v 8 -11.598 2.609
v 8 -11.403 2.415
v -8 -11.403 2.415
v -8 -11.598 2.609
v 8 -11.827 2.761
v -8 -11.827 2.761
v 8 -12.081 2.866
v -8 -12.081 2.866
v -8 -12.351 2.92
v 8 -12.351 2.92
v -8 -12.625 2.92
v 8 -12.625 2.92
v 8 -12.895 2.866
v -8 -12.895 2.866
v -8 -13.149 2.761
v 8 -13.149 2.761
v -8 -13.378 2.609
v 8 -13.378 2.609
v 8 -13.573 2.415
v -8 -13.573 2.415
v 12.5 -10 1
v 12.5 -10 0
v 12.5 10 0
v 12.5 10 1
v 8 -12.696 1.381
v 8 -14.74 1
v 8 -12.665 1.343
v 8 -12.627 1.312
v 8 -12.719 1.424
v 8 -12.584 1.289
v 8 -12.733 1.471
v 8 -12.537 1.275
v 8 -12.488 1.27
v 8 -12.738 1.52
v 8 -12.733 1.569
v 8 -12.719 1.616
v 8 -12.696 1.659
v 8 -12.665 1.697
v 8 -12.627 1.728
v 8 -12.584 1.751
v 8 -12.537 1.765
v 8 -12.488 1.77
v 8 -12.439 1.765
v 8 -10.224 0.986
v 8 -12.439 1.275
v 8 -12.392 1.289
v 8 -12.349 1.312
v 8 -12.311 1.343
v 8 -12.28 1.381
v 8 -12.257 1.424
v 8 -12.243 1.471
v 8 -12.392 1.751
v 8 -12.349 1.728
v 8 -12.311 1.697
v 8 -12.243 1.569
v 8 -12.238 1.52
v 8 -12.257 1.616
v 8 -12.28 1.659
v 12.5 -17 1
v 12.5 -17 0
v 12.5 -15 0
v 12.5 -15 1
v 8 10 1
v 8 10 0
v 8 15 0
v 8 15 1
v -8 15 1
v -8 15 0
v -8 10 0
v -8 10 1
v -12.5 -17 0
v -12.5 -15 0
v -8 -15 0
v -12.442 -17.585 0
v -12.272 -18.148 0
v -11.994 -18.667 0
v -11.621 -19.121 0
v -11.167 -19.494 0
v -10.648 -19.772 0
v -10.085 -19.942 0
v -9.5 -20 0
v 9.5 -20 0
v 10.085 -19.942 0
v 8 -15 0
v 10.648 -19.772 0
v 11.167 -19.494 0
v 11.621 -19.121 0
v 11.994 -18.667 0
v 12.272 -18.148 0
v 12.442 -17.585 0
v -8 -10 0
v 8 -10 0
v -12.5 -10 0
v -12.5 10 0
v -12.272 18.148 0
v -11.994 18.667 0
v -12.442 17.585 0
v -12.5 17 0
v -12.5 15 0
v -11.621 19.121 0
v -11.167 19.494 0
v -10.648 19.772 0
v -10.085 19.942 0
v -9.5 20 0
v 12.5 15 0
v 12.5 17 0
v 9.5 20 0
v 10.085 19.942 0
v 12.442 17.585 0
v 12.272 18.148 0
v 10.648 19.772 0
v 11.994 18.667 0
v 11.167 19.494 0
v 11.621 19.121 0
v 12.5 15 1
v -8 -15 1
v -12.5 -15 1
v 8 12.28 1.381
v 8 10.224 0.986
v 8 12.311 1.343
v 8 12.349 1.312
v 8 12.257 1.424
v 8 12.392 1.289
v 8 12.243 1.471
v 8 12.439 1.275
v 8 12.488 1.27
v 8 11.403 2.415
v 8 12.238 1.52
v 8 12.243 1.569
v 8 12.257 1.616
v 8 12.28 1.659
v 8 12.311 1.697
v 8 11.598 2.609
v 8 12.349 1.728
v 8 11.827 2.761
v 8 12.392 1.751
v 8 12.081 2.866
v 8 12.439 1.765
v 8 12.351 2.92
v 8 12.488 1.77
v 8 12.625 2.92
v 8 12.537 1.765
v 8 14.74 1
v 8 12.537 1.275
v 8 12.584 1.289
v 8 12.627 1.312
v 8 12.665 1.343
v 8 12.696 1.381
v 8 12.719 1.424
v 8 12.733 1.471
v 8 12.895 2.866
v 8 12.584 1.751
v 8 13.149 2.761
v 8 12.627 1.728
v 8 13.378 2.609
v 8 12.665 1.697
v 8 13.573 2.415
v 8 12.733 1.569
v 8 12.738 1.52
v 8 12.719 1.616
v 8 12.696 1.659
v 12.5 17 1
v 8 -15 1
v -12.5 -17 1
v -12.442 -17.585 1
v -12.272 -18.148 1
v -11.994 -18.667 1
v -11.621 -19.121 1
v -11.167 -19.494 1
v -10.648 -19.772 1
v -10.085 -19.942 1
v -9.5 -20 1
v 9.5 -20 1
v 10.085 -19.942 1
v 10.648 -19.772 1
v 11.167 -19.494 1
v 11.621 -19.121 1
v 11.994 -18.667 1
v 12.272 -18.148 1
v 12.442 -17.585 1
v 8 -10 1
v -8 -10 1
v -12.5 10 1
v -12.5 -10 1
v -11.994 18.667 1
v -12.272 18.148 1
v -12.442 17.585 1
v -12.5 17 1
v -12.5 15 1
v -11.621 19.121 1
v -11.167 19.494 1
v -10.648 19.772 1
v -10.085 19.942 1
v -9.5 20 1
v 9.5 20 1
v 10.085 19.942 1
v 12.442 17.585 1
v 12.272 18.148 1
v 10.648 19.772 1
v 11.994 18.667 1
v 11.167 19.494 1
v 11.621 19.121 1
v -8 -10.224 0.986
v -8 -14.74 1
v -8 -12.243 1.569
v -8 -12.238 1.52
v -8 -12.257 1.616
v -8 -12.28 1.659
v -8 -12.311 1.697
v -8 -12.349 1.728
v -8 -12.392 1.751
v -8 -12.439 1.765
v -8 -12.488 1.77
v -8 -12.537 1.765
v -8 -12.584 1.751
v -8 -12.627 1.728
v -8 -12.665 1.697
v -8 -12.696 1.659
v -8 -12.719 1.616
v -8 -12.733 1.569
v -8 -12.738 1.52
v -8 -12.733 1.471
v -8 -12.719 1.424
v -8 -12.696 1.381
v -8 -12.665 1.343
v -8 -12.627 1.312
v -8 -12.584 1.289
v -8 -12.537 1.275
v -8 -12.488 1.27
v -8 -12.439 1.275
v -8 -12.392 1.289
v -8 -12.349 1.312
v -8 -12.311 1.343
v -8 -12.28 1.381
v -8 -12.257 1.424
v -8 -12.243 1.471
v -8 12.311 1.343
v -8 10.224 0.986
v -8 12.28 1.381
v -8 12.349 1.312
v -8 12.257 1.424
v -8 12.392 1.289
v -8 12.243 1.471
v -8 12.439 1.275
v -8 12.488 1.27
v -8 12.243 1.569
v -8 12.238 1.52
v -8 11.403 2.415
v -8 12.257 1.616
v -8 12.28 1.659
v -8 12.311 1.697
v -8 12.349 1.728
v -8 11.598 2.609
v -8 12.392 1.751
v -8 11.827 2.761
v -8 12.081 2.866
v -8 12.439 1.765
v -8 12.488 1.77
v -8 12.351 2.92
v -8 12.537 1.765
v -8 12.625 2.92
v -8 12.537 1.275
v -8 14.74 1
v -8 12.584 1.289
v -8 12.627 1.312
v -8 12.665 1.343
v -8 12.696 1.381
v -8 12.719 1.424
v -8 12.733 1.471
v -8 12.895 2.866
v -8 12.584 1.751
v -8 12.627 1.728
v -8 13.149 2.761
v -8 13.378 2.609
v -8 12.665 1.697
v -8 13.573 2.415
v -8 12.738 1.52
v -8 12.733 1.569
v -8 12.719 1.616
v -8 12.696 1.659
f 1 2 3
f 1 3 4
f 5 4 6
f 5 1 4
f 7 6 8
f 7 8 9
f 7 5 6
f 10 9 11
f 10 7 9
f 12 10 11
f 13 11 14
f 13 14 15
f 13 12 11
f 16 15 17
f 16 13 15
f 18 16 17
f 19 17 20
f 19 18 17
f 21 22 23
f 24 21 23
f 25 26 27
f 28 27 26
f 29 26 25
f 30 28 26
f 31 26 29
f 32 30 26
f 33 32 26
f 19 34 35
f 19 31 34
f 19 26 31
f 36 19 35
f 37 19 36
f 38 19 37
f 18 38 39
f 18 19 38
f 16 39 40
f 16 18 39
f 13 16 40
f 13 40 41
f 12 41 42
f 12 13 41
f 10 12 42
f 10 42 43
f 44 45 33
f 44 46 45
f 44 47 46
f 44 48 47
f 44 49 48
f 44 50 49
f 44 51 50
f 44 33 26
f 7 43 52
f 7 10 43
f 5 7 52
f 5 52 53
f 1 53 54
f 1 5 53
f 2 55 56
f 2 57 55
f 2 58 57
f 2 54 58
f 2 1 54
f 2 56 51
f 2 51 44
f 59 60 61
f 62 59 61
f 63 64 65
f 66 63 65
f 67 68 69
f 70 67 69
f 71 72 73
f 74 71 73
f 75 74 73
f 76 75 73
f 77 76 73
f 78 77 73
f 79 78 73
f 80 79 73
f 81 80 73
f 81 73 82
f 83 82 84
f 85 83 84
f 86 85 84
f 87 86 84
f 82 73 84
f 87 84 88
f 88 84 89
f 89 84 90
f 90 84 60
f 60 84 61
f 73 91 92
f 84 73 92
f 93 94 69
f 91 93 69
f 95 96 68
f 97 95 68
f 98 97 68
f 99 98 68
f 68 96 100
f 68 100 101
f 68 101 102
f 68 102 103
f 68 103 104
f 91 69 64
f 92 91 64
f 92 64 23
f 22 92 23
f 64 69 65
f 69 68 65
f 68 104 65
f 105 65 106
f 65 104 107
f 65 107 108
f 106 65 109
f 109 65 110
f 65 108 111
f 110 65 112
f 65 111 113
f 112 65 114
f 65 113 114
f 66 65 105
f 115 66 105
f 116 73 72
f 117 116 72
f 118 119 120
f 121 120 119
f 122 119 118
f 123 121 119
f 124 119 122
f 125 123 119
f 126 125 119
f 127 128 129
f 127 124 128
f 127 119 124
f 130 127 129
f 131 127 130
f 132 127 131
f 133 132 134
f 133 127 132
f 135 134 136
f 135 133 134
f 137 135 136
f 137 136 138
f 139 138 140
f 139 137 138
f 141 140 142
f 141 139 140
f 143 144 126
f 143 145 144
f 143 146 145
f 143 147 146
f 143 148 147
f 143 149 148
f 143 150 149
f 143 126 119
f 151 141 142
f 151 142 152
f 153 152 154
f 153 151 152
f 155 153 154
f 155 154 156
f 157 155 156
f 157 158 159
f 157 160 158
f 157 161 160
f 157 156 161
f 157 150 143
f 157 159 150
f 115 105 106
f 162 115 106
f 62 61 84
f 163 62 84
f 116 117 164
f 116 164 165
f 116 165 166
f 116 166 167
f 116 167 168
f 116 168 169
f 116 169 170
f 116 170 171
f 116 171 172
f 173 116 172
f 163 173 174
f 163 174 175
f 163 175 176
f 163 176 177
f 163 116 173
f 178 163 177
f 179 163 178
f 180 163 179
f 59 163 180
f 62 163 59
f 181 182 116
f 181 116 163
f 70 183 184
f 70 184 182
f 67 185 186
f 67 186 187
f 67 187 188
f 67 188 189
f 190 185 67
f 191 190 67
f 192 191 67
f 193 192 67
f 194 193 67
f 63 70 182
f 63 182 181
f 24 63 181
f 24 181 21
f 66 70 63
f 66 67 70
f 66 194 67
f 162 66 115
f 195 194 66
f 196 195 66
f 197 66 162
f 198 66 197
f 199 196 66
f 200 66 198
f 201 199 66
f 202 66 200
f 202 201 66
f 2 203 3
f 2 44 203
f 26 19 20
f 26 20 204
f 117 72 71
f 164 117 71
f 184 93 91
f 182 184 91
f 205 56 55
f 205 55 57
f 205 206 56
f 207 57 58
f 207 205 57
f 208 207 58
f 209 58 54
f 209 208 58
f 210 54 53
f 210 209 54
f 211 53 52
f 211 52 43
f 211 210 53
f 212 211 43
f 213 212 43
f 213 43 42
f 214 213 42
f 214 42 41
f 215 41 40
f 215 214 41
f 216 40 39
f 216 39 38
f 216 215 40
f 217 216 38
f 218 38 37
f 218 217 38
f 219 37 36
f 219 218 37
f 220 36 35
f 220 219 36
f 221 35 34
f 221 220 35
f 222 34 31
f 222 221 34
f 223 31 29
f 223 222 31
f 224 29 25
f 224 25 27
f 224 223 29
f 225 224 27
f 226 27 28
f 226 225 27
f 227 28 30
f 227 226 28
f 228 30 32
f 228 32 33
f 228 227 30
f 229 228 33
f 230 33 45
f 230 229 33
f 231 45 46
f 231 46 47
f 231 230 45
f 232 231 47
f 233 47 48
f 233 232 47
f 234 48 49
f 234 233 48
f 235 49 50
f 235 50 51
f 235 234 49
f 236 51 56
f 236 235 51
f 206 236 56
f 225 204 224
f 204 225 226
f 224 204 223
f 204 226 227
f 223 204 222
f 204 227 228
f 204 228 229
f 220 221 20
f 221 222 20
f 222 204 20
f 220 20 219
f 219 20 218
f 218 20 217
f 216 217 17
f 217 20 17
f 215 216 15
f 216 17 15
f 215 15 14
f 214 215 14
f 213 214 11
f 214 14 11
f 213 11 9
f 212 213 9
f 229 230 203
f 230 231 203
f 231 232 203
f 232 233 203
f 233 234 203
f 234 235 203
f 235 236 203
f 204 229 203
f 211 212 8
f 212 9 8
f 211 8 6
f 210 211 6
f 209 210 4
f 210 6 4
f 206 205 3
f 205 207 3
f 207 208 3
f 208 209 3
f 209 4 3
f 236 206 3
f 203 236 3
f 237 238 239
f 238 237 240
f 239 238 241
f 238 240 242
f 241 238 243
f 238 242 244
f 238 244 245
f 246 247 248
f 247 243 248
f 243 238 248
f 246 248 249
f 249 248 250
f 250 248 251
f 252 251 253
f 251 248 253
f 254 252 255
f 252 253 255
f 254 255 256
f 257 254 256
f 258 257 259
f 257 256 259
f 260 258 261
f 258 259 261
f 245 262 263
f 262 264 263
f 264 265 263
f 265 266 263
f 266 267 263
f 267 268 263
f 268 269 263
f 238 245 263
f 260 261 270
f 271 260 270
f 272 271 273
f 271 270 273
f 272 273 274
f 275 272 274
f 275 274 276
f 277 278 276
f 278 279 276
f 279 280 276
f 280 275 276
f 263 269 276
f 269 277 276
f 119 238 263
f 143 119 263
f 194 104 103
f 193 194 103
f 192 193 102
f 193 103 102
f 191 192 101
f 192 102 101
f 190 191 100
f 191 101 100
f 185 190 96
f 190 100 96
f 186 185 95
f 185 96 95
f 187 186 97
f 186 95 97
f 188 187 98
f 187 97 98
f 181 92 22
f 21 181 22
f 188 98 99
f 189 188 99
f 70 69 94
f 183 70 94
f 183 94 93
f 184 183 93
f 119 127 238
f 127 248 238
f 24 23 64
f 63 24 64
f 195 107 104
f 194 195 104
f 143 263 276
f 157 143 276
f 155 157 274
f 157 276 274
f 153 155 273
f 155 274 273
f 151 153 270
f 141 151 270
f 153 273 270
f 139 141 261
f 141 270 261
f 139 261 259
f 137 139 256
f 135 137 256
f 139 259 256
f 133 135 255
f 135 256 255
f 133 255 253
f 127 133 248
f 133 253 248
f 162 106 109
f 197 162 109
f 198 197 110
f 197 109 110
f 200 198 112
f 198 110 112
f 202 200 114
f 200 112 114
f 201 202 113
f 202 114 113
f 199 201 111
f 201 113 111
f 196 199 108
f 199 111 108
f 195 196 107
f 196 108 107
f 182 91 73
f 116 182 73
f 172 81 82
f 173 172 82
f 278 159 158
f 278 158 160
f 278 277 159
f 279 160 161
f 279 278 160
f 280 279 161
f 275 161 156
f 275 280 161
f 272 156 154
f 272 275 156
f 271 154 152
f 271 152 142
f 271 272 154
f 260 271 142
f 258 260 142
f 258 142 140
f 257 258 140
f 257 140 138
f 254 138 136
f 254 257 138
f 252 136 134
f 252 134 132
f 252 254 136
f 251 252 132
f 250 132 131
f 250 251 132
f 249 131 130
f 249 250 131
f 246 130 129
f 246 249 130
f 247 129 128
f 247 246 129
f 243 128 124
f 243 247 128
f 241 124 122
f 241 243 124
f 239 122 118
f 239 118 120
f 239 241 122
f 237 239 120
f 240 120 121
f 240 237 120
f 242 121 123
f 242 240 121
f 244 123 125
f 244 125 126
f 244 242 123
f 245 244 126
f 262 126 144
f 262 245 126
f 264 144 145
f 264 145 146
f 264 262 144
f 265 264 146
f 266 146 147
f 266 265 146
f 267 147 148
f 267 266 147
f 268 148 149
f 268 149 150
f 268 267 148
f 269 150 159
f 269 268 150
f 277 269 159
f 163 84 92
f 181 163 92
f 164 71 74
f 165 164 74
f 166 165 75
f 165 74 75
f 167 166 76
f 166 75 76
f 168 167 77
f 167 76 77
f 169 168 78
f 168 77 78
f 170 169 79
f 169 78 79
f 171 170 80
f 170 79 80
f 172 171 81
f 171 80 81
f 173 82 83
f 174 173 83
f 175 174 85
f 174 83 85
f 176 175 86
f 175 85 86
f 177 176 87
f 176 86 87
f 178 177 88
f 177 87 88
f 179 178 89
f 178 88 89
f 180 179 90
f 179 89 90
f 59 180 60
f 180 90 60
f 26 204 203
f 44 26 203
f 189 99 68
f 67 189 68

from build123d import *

# Parameters (mm, degrees)
F1_DEPTH = 1
F2_R     = 0.25
F3_DEPTH = 8


with BuildPart() as f1:
    # F0 (on Top) → F1 (new body)
    with BuildSketch(Plane.XY):
        with BuildLine():
            ThreePointArc((12.5, 17), (11.62132, 19.12132), (9.5, 20))
            Line((9.5, 20), (-9.5, 20))
            ThreePointArc((-9.5, 20), (-11.62132, 19.12132), (-12.5, 17))
            Line((-12.5, 17), (-12.5, 15))
            Line((-12.5, 15), (-8, 15))
            Line((-8, 15), (-8, 10))
            Line((-8, 10), (-12.5, 10))
            Line((-12.5, 10), (-12.5, -10))
            Line((-12.5, -10), (-8, -10))
            Line((-8, -10), (-8, -15))
            Line((-8, -15), (-12.5, -15))
            Line((-12.5, -15), (-12.5, -17))
            ThreePointArc((-12.5, -17), (-11.62132, -19.12132), (-9.5, -20))
            Line((-9.5, -20), (9.5, -20))
            ThreePointArc((9.5, -20), (11.62132, -19.12132), (12.5, -17))
            Line((12.5, -17), (12.5, -15))
            Line((12.5, -15), (8, -15))
            Line((8, -15), (8, -10))
            Line((8, -10), (12.5, -10))
            Line((12.5, -10), (12.5, 10))
            Line((12.5, 10), (8, 10))
            Line((8, 10), (8, 15))
            Line((8, 15), (12.5, 15))
            Line((12.5, 15), (12.5, 17))
        make_face()
    extrude(amount=F1_DEPTH)


with BuildPart() as f3:
    # F2 (on Right) → F3 (new body, symmetric)
    with BuildSketch(Plane.YZ):
        with BuildLine():
            Line((14.740349, 1.000379), (13.572576, 2.415229))
            ThreePointArc((13.572576, 2.415229), (12.487946, 2.926366), (11.403316, 2.415229))
            Line((11.403316, 2.415229), (10.223768, 0.986112))
            Line((10.223768, 0.986112), (14.740349, 1.000379))
        make_face()
        with Locations((12.487946, 1.520009)):
            Circle(F2_R, mode=Mode.SUBTRACT)
        with BuildLine():
            Line((-10.223768, 0.986112), (-11.403316, 2.415229))
            ThreePointArc((-11.403316, 2.415229), (-12.487946, 2.926366), (-13.572576, 2.415229))
            Line((-13.572576, 2.415229), (-14.740349, 1.000379))
            Line((-14.740349, 1.000379), (-10.223768, 0.986112))
        make_face()
        with Locations((-12.487946, 1.520009)):
            Circle(F2_R, mode=Mode.SUBTRACT)
    extrude(amount=F3_DEPTH, both=True)


solid = Compound([f1.part, f3.part])
